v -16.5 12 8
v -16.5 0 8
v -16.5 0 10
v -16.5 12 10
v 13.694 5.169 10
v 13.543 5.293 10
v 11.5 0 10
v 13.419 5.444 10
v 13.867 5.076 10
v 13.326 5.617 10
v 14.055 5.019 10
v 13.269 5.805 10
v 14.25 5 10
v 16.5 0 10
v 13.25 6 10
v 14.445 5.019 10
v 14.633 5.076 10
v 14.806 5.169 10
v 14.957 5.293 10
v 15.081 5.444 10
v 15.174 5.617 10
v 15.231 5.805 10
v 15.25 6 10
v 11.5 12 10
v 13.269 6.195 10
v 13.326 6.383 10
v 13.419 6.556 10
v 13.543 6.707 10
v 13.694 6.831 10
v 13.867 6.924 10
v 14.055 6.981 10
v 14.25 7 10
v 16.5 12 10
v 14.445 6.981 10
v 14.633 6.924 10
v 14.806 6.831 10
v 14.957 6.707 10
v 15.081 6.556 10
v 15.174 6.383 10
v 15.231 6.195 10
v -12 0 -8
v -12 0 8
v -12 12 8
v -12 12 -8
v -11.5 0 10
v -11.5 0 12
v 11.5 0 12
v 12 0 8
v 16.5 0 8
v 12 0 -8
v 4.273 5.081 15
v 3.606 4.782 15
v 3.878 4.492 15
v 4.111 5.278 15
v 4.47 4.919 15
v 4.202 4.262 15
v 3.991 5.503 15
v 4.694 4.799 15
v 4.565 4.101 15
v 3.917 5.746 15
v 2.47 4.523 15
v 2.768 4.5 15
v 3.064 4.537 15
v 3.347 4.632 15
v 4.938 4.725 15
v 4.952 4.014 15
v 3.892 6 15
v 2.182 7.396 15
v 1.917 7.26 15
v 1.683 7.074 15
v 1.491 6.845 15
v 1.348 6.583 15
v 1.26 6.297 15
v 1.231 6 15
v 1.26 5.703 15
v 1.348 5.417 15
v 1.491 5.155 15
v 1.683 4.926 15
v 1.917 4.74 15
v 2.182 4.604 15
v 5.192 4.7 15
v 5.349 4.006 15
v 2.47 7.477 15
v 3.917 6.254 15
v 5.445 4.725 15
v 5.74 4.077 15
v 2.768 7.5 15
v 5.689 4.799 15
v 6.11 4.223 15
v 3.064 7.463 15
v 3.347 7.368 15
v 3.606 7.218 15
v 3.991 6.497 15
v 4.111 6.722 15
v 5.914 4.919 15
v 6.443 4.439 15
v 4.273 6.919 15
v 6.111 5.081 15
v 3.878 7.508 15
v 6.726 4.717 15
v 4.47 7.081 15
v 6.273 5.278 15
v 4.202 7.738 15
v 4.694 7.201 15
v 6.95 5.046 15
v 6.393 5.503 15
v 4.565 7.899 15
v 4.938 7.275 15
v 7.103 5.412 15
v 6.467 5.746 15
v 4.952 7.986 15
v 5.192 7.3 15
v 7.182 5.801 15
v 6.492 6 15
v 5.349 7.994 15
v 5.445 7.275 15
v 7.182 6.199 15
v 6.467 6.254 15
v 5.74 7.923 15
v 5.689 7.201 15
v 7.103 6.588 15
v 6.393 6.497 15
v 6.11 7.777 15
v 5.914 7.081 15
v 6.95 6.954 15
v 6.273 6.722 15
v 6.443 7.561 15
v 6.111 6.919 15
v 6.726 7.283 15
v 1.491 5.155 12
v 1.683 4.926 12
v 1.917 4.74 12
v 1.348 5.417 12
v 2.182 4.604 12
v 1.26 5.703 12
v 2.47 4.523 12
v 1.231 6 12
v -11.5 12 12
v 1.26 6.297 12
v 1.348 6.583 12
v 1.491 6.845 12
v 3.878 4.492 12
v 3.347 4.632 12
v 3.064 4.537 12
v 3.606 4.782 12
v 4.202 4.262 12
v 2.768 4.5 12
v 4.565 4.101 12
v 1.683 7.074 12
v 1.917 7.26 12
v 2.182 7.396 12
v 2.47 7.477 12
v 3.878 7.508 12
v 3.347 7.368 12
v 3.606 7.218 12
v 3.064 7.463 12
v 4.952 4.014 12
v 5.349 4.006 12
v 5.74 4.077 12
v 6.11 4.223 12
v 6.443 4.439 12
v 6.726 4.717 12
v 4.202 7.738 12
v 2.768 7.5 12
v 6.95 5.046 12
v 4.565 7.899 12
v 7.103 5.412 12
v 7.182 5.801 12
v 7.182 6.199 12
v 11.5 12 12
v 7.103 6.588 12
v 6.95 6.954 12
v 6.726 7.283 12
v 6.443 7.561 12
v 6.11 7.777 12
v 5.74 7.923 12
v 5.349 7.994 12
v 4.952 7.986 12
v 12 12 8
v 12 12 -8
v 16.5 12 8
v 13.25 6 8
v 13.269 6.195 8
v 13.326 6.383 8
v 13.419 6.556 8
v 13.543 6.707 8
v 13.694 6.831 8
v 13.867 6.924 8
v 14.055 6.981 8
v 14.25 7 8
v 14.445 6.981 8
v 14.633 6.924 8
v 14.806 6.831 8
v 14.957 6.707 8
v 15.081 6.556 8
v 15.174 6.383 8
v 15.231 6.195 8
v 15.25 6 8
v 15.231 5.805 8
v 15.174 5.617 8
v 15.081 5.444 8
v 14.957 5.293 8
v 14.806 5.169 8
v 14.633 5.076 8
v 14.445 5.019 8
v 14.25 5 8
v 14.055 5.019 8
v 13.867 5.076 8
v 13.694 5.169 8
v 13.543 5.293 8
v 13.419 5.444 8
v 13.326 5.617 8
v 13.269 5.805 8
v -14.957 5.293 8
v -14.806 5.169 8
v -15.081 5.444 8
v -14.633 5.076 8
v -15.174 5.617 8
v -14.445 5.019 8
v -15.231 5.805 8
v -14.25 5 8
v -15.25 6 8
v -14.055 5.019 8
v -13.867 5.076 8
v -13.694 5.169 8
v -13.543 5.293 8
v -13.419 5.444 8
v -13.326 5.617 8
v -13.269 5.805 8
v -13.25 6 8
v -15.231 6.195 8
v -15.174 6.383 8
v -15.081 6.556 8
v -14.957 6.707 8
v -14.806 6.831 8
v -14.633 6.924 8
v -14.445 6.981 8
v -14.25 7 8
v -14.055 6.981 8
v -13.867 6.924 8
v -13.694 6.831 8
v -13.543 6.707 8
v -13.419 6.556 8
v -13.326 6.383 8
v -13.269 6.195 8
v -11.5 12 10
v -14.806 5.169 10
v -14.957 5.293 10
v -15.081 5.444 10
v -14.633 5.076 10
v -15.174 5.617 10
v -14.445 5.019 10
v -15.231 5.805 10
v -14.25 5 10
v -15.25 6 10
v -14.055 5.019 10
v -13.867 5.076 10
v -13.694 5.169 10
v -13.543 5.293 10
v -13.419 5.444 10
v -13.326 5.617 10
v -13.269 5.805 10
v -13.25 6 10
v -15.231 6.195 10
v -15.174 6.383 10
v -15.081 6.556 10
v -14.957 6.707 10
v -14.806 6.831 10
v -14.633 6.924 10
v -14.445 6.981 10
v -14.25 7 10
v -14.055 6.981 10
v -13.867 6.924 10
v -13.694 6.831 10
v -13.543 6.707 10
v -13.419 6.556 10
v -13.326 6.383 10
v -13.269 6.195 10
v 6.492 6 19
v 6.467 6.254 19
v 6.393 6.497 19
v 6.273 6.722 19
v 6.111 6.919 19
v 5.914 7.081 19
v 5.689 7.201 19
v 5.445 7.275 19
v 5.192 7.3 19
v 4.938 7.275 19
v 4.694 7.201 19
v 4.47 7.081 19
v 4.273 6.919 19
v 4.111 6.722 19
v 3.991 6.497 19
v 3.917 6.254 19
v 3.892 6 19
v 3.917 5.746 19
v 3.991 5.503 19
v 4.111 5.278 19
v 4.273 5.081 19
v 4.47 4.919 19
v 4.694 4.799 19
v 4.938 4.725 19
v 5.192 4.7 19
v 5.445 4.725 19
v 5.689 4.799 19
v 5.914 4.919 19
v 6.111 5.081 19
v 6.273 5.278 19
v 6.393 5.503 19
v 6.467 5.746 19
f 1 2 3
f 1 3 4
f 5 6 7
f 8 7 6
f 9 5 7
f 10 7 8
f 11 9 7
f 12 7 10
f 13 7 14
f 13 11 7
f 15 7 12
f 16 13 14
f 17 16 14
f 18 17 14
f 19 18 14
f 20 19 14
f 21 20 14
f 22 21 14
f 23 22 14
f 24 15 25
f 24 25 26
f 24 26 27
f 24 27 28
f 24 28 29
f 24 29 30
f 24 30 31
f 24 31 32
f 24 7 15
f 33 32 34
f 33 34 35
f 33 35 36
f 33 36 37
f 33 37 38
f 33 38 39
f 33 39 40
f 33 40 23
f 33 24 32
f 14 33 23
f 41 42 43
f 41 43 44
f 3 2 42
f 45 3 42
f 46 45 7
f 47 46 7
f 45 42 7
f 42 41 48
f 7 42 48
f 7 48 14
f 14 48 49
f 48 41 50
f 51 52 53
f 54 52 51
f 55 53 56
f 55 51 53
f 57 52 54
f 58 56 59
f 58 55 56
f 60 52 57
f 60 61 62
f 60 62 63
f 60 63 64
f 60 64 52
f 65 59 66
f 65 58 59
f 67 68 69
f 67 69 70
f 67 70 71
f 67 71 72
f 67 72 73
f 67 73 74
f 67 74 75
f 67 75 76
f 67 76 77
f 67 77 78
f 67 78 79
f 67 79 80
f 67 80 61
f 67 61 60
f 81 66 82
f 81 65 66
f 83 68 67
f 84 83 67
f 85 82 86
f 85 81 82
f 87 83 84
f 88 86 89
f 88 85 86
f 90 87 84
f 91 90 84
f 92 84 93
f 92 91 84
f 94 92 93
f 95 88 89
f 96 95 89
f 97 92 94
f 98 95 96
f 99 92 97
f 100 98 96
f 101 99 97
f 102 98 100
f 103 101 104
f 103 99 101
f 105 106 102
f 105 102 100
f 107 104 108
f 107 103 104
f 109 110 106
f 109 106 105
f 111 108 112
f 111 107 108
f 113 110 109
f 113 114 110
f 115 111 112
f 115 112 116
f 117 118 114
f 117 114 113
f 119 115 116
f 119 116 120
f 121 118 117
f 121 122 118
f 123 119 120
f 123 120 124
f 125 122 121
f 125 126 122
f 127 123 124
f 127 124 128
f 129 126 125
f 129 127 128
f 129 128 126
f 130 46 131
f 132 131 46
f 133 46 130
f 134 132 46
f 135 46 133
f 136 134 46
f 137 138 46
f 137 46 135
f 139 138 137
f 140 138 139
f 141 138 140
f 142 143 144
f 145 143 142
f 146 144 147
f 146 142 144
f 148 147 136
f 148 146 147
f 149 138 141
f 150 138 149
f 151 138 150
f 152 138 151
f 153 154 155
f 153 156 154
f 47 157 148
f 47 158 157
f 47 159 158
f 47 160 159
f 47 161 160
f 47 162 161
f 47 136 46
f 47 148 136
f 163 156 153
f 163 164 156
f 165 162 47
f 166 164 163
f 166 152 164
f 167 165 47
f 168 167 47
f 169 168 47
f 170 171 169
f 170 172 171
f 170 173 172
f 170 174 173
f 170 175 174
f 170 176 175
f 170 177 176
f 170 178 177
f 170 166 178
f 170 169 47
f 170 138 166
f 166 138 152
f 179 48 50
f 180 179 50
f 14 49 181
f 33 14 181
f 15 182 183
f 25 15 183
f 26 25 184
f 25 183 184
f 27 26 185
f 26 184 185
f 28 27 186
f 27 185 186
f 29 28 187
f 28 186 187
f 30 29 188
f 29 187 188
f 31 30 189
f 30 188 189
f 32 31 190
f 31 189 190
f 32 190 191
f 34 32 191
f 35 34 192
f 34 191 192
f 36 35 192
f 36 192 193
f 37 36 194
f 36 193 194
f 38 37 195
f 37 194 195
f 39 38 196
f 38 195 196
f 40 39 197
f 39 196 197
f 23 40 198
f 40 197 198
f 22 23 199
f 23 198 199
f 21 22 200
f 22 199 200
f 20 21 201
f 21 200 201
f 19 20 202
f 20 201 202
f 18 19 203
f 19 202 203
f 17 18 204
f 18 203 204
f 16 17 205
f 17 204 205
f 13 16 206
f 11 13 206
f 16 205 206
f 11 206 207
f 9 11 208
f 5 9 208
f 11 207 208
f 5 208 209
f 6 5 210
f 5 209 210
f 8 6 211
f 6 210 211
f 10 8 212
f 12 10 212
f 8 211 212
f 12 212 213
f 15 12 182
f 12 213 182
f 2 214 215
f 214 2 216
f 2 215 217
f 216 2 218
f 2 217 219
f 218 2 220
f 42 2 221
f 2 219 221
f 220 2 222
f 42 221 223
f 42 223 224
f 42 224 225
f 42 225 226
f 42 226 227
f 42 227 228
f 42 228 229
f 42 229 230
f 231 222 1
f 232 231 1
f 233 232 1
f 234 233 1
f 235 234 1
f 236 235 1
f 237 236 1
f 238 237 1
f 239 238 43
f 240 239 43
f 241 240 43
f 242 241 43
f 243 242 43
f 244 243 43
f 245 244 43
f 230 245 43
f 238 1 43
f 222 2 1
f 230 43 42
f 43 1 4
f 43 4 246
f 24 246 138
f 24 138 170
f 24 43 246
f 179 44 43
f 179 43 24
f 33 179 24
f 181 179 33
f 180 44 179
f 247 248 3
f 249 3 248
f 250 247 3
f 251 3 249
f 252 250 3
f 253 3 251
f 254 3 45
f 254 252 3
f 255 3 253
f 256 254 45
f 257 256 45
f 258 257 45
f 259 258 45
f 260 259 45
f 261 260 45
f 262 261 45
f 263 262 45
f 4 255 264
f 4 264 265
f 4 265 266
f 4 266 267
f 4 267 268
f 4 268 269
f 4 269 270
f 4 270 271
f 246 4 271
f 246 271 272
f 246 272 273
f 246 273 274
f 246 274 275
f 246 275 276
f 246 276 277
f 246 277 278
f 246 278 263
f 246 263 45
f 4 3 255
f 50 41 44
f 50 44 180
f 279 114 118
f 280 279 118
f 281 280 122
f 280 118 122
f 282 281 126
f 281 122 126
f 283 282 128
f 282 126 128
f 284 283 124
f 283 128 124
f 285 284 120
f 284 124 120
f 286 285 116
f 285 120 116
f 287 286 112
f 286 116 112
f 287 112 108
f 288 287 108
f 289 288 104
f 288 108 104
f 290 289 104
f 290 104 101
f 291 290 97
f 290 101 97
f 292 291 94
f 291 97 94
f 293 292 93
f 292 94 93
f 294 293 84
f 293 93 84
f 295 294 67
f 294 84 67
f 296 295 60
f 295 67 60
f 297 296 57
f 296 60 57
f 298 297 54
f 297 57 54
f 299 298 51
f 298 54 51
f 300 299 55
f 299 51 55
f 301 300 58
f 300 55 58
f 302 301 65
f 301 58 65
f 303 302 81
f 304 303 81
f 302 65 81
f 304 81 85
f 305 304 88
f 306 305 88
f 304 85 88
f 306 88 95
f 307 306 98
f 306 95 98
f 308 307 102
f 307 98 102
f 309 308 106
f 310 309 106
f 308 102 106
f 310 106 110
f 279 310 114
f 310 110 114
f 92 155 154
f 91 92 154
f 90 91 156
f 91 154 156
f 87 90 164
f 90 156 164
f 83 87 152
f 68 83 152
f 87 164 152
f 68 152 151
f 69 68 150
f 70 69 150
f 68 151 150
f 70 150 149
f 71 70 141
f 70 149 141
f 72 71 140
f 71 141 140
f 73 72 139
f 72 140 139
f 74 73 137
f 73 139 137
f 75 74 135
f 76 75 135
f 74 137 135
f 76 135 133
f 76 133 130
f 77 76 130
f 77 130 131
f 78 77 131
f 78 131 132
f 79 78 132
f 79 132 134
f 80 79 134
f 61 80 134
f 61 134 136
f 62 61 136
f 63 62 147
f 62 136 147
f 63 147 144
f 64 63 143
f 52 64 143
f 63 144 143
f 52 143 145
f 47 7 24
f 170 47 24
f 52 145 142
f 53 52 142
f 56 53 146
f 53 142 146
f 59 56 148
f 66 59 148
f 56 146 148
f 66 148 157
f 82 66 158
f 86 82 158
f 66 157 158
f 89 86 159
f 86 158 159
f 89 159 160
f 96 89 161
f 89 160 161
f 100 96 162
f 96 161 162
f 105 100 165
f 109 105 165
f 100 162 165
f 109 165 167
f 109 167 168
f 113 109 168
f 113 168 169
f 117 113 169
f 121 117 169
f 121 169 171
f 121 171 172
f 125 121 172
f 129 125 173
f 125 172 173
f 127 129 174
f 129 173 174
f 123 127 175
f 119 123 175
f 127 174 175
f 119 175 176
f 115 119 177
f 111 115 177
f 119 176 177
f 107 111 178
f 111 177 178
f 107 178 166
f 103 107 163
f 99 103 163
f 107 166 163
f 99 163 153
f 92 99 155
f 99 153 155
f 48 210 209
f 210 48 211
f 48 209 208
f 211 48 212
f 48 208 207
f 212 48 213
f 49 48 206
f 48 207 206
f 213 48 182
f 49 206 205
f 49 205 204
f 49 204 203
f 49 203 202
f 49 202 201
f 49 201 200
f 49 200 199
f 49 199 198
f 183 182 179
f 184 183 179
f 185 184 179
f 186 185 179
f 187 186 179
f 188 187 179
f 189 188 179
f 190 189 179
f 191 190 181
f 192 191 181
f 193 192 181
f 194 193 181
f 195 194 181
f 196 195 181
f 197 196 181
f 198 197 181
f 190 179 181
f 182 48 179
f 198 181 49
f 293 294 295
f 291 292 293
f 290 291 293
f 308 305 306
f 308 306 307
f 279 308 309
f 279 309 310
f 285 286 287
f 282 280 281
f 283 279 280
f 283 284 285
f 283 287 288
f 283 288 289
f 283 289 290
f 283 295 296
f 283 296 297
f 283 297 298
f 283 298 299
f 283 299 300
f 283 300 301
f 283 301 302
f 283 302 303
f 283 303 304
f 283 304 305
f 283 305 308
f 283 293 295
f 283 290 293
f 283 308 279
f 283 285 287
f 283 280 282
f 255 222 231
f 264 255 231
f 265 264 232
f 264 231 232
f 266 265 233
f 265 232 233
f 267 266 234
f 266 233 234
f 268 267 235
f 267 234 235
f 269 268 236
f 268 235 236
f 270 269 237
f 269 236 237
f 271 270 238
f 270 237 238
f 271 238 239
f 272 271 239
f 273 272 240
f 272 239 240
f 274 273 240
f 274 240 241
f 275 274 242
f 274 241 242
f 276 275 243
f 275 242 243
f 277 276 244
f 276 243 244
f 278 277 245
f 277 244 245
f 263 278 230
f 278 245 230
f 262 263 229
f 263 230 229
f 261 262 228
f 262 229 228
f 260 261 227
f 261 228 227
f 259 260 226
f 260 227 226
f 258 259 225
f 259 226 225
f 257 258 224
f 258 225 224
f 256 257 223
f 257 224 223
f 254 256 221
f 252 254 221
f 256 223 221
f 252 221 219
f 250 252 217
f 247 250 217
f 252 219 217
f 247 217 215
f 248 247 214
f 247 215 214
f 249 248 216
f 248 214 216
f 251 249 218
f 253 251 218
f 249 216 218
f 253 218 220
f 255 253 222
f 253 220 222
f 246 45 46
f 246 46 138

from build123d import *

# Parameters (mm, degrees)
SKETCH_1_W          = 24
SKETCH_1_H          = 16
EXTRUDE_1_DEPTH     = 12
SKETCH_2_W          = 33
SKETCH_2_H          = 12
EXTRUDE_2_DEPTH     = 2
SKETCH_3_R          = 1
CUT_EXTRUDE_1_DEPTH = 2
SKETCH_4_W          = 23
SKETCH_4_H          = 12
EXTRUDE_3_DEPTH     = 2
EXTRUDE_4_DEPTH     = 3
SKETCH_7_R          = 1.3
EXTRUDE_5_DEPTH     = 4


with BuildPart() as part:
    # 草图1 → 凸台-拉伸1 (new body)
    with BuildSketch(Plane(origin=(0, 0, 0), x_dir=(1, 0, 0), z_dir=(0, 1, 0))):
        Rectangle(SKETCH_1_W, SKETCH_1_H)
    extrude(amount=EXTRUDE_1_DEPTH)

    # 草图2 → 凸台-拉伸2 (add)
    with BuildSketch(Plane.XY.offset(8)):
        with Locations((0, 6)):
            Rectangle(SKETCH_2_W, SKETCH_2_H)
    extrude(amount=EXTRUDE_2_DEPTH)

    # 草图3 → 切除-拉伸1 (cut)
    with BuildSketch(Plane(origin=(0, 0, 8), x_dir=(-1, 0, 0), z_dir=(0, 0, -1))):
        with Locations((14.25, 6)):
            Circle(SKETCH_3_R)
        with Locations((-14.25, 6)):
            Circle(SKETCH_3_R)
    extrude(amount=-CUT_EXTRUDE_1_DEPTH, mode=Mode.SUBTRACT)

    # 草图4 → 凸台-拉伸3 (add)
    with BuildSketch(Plane.XY.offset(10)):
        with Locations((0, 6)):
            Rectangle(SKETCH_4_W, SKETCH_4_H)
    extrude(amount=EXTRUDE_3_DEPTH)

    # 草图6 → 凸台-拉伸4 (add)
    with BuildSketch(Plane.XY.offset(12)):
        with BuildLine():
            ThreePointArc((3.605751042, 4.7816434), (7.191817621, 6), (3.605751042, 7.2183566))
            ThreePointArc((3.605751042, 7.2183566), (1.230761216, 6), (3.605751042, 4.7816434))
        make_face()
    extrude(amount=EXTRUDE_4_DEPTH)

    # 草图7 → 凸台-拉伸5 (add)
    with BuildSketch(Plane.XY.offset(15)):
        with Locations((5.191817621, 6)):
            Circle(SKETCH_7_R)
    extrude(amount=EXTRUDE_5_DEPTH)


solid = part.part
